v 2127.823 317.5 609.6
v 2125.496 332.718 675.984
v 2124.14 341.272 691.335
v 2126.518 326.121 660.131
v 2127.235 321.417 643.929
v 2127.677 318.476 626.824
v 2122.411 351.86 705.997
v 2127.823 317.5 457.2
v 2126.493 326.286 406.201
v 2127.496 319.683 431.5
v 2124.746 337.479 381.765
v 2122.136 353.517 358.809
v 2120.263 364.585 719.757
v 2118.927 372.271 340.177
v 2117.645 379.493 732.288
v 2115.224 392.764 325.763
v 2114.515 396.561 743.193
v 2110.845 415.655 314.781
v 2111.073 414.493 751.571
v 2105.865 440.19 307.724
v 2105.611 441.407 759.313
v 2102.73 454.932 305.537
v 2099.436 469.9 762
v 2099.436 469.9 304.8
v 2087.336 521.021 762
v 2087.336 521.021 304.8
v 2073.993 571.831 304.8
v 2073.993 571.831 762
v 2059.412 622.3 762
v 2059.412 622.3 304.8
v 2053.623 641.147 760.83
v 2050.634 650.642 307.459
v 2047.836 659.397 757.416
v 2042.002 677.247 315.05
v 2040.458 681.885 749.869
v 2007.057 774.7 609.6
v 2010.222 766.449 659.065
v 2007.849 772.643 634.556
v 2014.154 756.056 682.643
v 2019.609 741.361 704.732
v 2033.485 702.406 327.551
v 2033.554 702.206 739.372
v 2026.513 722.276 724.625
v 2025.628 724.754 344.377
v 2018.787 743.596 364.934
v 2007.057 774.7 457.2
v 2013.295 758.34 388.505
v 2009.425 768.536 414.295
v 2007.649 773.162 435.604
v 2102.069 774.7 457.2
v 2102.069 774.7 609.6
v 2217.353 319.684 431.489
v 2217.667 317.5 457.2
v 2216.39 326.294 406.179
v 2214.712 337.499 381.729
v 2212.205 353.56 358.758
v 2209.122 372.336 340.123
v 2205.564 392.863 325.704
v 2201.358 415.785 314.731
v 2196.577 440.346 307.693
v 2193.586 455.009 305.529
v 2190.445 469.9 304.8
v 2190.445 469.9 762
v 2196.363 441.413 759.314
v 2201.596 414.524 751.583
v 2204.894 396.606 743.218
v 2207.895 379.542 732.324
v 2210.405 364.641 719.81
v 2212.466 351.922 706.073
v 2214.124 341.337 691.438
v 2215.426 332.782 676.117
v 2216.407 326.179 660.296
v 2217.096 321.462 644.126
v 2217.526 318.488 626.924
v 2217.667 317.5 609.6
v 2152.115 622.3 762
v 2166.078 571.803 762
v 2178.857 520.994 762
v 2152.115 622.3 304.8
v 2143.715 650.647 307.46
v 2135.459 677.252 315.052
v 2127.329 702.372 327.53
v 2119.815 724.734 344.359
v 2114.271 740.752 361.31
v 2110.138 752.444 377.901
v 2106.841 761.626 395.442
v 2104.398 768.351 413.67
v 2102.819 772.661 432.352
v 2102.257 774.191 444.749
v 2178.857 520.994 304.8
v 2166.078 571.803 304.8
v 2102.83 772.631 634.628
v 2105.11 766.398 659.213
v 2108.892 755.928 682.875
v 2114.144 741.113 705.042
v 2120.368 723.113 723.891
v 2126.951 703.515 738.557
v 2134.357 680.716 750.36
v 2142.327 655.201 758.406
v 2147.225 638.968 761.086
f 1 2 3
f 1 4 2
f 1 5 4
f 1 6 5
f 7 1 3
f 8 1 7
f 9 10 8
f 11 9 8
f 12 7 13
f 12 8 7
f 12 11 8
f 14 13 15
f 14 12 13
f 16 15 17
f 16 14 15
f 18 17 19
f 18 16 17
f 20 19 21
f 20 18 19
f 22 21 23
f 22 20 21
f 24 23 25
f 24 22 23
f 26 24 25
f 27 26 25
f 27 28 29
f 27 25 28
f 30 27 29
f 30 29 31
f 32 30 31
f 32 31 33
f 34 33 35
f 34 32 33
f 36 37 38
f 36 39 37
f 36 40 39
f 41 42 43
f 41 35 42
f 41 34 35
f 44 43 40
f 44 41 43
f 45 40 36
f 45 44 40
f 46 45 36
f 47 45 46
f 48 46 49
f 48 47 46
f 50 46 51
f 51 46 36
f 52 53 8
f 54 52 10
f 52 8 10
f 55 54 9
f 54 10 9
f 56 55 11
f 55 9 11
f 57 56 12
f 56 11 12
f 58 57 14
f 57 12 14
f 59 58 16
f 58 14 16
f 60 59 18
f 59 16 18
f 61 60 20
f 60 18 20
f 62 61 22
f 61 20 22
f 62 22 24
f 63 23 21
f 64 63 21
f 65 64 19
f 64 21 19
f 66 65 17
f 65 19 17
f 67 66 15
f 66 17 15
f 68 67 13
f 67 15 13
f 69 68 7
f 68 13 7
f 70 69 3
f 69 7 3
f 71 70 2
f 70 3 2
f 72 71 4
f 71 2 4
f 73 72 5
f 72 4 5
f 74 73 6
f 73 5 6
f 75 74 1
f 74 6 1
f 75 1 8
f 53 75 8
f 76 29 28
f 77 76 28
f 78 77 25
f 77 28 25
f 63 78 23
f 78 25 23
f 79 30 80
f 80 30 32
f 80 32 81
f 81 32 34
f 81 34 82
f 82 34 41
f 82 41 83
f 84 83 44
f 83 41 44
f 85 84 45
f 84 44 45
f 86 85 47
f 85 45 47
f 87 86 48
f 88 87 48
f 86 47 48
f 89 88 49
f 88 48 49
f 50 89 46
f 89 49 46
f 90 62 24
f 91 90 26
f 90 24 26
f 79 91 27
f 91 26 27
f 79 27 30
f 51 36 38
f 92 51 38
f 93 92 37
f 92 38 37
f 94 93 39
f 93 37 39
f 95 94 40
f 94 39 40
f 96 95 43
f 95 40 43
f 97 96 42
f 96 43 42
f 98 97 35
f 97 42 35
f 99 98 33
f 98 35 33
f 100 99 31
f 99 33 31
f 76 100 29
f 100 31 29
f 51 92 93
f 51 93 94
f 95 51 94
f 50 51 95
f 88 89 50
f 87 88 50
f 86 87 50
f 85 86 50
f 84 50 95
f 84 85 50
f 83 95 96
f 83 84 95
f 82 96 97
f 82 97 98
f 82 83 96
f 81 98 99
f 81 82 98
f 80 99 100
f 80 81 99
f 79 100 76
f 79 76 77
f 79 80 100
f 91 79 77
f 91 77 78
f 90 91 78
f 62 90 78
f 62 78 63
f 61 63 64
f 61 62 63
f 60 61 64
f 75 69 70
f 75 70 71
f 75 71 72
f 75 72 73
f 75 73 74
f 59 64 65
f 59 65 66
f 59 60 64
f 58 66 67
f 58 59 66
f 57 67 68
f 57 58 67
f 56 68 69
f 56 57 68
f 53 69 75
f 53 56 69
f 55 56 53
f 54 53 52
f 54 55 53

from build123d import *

# Parameters (mm, degrees)
BOSS_EXTRUDE2_DEPTH     = 1066.8
CUT_EXTRUDE1_DEPTH      = 2806.00308884
CUT_EXTRUDE1_DEPTH_BACK = 2806.00308884


with BuildPart() as part:
    # Sketch1 → Boss-Extrude2 (new body)
    with BuildSketch(Plane.XY):
        with BuildLine():
            Line((1708.013552171, 1308.1), (1818.71626935, 1308.1))
            ThreePointArc((1818.71626935, 1308.1), (2198.04838822, 432.940829033), (2178.927715276, -520.7))
            Line((2178.927715276, -520.7), (2087.416444891, -520.7))
            ThreePointArc((2087.416444891, -520.7), (2106.525474721, 437.019826496), (1708.013552171, 1308.1))
        make_face()
    extrude(amount=BOSS_EXTRUDE2_DEPTH)

    # Sketch2 → Cut-Extrude1 (cut, two sides: drawn at the far end of the back side and taken through both)
    with BuildSketch(Plane(origin=(0, 0, 0), x_dir=(0, 0, -1), z_dir=(1, 0, 0)).offset(-CUT_EXTRUDE1_DEPTH_BACK)):
        with BuildLine():
            Line((-6736.08, -5778.5), (5669.28, -5778.5))
            ThreePointArc((5669.28, -5778.5), (5755.490458762, -5742.790458762), (5791.2, -5656.58))
            Line((5791.2, -5656.58), (5791.2, 6748.78))
            ThreePointArc((5791.2, 6748.78), (5755.490458762, 6834.990458762), (5669.28, 6870.7))
            Line((5669.28, 6870.7), (-6736.08, 6870.7))
            ThreePointArc((-6736.08, 6870.7), (-6822.290458762, 6834.990458762), (-6858, 6748.78))
            Line((-6858, 6748.78), (-6858, -5656.58))
            ThreePointArc((-6858, -5656.58), (-6822.290458762, -5742.790458762), (-6736.08, -5778.5))
        make_face()
        with BuildLine():
            Line((-609.6, 317.5), (-457.2, 317.5))
            ThreePointArc((-457.2, 317.5), (-349.436926547, 362.136926547), (-304.8, 469.9))
            Line((-304.8, 469.9), (-304.8, 622.3))
            ThreePointArc((-304.8, 622.3), (-349.436926547, 730.063073453), (-457.2, 774.7))
            Line((-457.2, 774.7), (-609.6, 774.7))
            ThreePointArc((-609.6, 774.7), (-717.363073453, 730.063073453), (-762, 622.3))
            Line((-762, 622.3), (-762, 469.9))
            ThreePointArc((-762, 469.9), (-717.363073453, 362.136926547), (-609.6, 317.5))
        make_face(mode=Mode.SUBTRACT)
    extrude(amount=CUT_EXTRUDE1_DEPTH + CUT_EXTRUDE1_DEPTH_BACK, mode=Mode.SUBTRACT)


solid = part.part
